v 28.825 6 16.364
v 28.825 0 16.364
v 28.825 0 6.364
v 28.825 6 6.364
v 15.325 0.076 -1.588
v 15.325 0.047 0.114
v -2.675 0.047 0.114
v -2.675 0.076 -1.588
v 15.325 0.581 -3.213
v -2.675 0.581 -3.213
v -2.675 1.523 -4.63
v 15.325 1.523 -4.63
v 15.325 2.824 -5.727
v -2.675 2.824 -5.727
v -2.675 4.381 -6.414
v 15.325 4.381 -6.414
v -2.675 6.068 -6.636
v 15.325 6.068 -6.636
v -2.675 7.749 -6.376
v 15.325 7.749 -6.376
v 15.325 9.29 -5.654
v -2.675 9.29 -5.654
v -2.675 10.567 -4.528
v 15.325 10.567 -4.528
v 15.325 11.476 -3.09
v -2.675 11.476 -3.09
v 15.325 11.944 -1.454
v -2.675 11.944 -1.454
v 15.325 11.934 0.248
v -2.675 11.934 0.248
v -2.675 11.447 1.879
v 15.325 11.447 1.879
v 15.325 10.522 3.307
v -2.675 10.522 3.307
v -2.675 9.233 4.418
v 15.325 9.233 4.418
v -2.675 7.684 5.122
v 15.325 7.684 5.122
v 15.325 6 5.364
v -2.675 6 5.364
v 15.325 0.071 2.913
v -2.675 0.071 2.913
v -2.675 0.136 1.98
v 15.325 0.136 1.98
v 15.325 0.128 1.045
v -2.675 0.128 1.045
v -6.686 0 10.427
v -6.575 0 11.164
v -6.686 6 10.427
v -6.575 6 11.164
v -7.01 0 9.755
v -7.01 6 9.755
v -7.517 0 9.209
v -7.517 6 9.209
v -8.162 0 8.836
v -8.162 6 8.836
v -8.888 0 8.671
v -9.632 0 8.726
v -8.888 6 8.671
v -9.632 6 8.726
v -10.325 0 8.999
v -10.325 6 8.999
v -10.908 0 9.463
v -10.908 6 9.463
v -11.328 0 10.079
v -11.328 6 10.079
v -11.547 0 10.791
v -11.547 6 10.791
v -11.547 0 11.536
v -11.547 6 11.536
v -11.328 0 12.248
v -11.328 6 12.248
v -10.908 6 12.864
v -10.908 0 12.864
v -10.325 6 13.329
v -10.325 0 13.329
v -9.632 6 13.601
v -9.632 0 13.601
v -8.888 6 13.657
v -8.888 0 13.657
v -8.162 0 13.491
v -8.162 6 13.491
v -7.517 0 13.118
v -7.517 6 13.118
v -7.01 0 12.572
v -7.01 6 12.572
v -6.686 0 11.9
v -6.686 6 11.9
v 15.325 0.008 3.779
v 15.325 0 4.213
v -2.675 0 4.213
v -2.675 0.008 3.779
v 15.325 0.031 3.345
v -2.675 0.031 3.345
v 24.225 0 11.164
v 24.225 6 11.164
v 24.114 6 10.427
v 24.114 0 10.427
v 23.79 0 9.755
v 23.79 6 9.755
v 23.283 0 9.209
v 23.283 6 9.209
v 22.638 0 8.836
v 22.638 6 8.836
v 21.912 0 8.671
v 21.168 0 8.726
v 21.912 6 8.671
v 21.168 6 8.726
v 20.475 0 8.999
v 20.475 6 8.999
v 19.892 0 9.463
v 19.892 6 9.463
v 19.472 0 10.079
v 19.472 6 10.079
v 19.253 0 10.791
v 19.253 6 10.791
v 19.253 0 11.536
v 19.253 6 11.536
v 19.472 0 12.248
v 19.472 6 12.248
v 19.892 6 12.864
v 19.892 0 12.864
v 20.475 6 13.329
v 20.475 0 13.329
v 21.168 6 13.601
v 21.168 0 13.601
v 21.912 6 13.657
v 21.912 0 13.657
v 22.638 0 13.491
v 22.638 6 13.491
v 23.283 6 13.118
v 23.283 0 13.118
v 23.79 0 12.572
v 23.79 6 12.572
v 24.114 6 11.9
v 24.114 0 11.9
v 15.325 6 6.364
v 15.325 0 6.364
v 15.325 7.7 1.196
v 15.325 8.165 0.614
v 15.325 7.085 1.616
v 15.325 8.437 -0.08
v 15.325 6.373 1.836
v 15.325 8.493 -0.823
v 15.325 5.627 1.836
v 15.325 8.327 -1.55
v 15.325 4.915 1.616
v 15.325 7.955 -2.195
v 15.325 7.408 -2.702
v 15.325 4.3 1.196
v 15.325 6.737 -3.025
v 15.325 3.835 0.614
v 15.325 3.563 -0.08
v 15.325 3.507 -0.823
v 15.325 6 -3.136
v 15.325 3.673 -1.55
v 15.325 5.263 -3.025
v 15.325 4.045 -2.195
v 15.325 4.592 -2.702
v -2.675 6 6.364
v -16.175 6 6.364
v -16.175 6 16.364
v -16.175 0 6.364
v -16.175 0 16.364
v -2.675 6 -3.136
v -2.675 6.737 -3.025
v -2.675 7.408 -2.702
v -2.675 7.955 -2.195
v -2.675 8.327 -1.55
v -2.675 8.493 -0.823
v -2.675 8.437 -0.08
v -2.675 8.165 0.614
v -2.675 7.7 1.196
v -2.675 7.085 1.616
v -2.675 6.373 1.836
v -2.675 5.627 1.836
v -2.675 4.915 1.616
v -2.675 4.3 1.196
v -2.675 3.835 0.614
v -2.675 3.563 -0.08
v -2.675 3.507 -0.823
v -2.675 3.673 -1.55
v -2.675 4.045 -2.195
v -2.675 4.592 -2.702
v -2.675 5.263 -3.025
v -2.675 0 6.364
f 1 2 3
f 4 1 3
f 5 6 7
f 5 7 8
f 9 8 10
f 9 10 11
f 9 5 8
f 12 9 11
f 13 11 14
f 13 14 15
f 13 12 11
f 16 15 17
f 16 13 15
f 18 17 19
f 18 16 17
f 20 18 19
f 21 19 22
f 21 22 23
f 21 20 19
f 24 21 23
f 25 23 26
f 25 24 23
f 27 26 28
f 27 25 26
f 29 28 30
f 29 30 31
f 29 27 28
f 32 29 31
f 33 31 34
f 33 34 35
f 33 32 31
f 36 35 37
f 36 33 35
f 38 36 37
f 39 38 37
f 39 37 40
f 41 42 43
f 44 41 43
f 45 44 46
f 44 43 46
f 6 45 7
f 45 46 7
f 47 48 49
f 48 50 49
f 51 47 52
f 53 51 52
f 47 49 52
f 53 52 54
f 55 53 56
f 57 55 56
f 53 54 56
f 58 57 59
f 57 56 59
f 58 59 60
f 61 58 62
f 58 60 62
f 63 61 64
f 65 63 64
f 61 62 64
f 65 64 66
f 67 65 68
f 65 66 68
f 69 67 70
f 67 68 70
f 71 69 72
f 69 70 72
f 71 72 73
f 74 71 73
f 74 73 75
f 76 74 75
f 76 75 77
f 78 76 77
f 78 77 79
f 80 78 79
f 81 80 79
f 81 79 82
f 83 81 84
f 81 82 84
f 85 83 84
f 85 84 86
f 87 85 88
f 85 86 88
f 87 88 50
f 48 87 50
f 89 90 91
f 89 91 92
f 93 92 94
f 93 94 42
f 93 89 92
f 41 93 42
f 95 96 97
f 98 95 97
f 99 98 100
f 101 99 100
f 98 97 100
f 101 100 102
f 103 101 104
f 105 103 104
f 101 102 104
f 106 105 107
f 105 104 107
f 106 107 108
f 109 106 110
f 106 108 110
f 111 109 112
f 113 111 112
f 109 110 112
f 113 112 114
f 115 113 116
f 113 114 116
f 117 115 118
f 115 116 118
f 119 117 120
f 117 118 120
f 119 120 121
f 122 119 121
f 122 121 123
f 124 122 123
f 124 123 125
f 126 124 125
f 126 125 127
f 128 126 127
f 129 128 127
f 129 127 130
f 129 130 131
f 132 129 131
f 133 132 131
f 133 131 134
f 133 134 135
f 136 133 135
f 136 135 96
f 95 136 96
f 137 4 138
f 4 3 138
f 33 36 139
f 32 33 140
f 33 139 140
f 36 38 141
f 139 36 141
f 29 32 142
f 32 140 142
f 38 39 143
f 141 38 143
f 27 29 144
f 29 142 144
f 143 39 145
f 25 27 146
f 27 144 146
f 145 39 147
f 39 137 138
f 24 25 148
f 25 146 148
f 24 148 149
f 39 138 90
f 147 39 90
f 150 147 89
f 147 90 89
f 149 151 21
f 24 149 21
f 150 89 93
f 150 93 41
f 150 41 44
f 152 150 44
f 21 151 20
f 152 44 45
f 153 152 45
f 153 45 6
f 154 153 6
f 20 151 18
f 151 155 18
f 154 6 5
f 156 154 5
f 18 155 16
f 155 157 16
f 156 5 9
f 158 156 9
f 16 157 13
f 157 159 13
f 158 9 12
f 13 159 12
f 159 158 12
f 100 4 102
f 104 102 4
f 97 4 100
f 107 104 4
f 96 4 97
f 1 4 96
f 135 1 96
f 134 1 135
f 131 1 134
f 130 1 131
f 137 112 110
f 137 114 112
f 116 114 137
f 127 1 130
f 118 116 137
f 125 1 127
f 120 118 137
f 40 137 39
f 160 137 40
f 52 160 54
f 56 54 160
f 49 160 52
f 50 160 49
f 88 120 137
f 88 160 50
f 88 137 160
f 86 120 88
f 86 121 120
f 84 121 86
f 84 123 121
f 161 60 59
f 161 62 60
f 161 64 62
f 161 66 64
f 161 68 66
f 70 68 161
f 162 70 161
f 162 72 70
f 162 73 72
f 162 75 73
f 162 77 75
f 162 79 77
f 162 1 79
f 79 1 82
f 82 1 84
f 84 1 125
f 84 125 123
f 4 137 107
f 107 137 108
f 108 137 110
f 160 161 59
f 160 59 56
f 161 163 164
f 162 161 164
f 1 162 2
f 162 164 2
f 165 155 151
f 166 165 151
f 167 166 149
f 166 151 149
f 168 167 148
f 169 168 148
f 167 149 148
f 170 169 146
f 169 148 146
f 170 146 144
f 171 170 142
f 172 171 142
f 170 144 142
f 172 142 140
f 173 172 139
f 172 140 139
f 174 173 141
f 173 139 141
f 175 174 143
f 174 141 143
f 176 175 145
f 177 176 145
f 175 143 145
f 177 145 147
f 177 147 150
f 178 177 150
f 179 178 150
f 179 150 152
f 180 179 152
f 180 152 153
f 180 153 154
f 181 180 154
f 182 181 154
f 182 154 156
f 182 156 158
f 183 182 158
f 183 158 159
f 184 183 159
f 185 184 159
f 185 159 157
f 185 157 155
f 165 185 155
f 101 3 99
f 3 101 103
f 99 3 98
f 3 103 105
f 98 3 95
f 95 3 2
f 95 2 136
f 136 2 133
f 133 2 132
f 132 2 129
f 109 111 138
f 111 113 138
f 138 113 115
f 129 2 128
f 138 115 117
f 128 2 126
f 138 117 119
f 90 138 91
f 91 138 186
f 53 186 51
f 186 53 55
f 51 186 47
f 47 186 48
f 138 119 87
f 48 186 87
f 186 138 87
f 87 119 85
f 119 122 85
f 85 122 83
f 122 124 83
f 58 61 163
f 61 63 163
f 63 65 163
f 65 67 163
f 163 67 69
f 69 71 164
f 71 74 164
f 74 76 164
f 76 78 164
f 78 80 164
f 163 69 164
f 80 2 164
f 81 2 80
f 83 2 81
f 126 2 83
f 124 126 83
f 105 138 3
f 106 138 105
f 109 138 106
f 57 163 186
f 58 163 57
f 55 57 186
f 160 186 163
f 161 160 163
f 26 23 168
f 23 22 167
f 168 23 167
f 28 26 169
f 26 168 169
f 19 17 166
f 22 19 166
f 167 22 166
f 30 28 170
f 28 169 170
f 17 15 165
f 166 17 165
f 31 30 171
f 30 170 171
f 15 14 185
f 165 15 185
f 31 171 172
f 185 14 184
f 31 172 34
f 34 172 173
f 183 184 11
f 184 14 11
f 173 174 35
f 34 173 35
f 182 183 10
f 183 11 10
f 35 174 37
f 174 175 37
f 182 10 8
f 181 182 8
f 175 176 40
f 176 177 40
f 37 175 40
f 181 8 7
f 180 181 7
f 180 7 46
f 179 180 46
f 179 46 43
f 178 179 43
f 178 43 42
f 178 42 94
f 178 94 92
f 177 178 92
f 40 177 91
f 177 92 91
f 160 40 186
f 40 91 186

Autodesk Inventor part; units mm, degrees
ref_plane "YZ Plane" through (0, 0, 0) normal (1, 0, 0) x (0, 1, 0)
ref_plane "XZ Plane" through (0, 0, 0) normal (0, 1, 0) x (-1, 0, 0)
sketch "Sketch1" plane through (0, 0, 0) normal (0, 1, 0) x (-1, 0, 0)
  line L0 (16.1753, 16.3636) -> (-28.8247, 16.3636)
  line L1 (-28.8247, 16.3636) -> (-28.8247, 6.3636)
  line L2 (16.1753, 6.3636) -> (16.1753, 16.3636)
  line L3 (-17.8247, 6.3636) -> (-17.8247, 1.3636)
  line L4 (-17.8247, 1.3636) -> (5.1753, 1.3636)
  line L5 (5.1753, 1.3636) -> (5.1753, 6.3636)
  line L6 (-28.8247, 6.3636) -> (-17.8247, 6.3636)
  line L7 (5.1753, 6.3636) -> (16.1753, 6.3636)
  point P0 (0, 0)
  dimension "d4" = 45
  dimension "d5" = 5
  dimension "d6" = 5
  dimension "d7" = 11
  dimension "d8" = 11
  dimension "d9" = 23
  dimension "d10" = 10
extrude "Extrusion1" add sketch "Sketch1" along normal blind 6
sketch "Sketch4" plane through (17.8247, 0, 6.3636) normal (1, 0, 0) x (0, 0, -1)
  circle A0 centre (7, 6) radius 6
  line L0 (0, 6) -> (5, 6) projected
  line L1 (0, 0) -> (0, 6) projected
  point P0 (6.3636, 0)
  dimension "d20" = 12
  dimension "d21" = 0
  dimension "d36" = 7
extrude "Extrusion4" add sketch "Sketch4" against normal up to surface (23 mm away)
fillet "Fillet1" radius 12 2 edges at (6.3247, 0.3431, 1.3636) (6.3247, 0, 1.3636)
sketch "Sketch5" plane through (17.8247, 0, 6.3636) normal (1, 0, 0) x (0, 0, -1)
  circle A0 centre (7, 6) radius 6 projected
  circle A1 centre (7, 6) radius 2.5
  point P0 (6.3636, 0)
  point P1 (1, 6)
  point P2 (6.25, 0.0471)
  dimension "d27" = 5
extrude "Extrusion5" cut sketch "Sketch5" against normal through all contours A1
ref_plane "Work Plane1" through (17.8247, 6, -6.6364) normal (0, 0, 1) x (1, 0, 0)
sketch "Sketch6" plane through (0, 6, 0) normal (0, 1, 0) x (1, 0, 0)
  circle A0 centre (-9.0753, -11.1636) radius 2.5
  circle A1 centre (21.7247, -11.1636) radius 2.5
  line L0 (37.8247, 6.6364) -> (-25.1753, 6.6364) projected
  line L1 (28.8247, -16.3636) -> (28.8247, -6.3636) projected
  line L2 (-16.1753, -6.3636) -> (-16.1753, -16.3636) projected
  point P0 (0, 0)
  dimension "d33" = 5
  dimension "d34" = 5
  dimension "d35" = 17.8
  dimension "d37" = 17.8
  dimension "d38" = 7.1
  dimension "d39" = 30.8
  dimension "d40" = 7.1
extrude "Extrusion6" cut sketch "Sketch6" against normal through all
move faces "Move1" translate (-2.5, 0, 0) faces at (17.8247, 3.6127, 3.7179)
move faces "Move2" translate (2.5, 0, 0) faces at (-5.1753, 3.6127, 3.7179) (1.658, 5.7988, -3.1283)
properties part number "Cerniera 1"
